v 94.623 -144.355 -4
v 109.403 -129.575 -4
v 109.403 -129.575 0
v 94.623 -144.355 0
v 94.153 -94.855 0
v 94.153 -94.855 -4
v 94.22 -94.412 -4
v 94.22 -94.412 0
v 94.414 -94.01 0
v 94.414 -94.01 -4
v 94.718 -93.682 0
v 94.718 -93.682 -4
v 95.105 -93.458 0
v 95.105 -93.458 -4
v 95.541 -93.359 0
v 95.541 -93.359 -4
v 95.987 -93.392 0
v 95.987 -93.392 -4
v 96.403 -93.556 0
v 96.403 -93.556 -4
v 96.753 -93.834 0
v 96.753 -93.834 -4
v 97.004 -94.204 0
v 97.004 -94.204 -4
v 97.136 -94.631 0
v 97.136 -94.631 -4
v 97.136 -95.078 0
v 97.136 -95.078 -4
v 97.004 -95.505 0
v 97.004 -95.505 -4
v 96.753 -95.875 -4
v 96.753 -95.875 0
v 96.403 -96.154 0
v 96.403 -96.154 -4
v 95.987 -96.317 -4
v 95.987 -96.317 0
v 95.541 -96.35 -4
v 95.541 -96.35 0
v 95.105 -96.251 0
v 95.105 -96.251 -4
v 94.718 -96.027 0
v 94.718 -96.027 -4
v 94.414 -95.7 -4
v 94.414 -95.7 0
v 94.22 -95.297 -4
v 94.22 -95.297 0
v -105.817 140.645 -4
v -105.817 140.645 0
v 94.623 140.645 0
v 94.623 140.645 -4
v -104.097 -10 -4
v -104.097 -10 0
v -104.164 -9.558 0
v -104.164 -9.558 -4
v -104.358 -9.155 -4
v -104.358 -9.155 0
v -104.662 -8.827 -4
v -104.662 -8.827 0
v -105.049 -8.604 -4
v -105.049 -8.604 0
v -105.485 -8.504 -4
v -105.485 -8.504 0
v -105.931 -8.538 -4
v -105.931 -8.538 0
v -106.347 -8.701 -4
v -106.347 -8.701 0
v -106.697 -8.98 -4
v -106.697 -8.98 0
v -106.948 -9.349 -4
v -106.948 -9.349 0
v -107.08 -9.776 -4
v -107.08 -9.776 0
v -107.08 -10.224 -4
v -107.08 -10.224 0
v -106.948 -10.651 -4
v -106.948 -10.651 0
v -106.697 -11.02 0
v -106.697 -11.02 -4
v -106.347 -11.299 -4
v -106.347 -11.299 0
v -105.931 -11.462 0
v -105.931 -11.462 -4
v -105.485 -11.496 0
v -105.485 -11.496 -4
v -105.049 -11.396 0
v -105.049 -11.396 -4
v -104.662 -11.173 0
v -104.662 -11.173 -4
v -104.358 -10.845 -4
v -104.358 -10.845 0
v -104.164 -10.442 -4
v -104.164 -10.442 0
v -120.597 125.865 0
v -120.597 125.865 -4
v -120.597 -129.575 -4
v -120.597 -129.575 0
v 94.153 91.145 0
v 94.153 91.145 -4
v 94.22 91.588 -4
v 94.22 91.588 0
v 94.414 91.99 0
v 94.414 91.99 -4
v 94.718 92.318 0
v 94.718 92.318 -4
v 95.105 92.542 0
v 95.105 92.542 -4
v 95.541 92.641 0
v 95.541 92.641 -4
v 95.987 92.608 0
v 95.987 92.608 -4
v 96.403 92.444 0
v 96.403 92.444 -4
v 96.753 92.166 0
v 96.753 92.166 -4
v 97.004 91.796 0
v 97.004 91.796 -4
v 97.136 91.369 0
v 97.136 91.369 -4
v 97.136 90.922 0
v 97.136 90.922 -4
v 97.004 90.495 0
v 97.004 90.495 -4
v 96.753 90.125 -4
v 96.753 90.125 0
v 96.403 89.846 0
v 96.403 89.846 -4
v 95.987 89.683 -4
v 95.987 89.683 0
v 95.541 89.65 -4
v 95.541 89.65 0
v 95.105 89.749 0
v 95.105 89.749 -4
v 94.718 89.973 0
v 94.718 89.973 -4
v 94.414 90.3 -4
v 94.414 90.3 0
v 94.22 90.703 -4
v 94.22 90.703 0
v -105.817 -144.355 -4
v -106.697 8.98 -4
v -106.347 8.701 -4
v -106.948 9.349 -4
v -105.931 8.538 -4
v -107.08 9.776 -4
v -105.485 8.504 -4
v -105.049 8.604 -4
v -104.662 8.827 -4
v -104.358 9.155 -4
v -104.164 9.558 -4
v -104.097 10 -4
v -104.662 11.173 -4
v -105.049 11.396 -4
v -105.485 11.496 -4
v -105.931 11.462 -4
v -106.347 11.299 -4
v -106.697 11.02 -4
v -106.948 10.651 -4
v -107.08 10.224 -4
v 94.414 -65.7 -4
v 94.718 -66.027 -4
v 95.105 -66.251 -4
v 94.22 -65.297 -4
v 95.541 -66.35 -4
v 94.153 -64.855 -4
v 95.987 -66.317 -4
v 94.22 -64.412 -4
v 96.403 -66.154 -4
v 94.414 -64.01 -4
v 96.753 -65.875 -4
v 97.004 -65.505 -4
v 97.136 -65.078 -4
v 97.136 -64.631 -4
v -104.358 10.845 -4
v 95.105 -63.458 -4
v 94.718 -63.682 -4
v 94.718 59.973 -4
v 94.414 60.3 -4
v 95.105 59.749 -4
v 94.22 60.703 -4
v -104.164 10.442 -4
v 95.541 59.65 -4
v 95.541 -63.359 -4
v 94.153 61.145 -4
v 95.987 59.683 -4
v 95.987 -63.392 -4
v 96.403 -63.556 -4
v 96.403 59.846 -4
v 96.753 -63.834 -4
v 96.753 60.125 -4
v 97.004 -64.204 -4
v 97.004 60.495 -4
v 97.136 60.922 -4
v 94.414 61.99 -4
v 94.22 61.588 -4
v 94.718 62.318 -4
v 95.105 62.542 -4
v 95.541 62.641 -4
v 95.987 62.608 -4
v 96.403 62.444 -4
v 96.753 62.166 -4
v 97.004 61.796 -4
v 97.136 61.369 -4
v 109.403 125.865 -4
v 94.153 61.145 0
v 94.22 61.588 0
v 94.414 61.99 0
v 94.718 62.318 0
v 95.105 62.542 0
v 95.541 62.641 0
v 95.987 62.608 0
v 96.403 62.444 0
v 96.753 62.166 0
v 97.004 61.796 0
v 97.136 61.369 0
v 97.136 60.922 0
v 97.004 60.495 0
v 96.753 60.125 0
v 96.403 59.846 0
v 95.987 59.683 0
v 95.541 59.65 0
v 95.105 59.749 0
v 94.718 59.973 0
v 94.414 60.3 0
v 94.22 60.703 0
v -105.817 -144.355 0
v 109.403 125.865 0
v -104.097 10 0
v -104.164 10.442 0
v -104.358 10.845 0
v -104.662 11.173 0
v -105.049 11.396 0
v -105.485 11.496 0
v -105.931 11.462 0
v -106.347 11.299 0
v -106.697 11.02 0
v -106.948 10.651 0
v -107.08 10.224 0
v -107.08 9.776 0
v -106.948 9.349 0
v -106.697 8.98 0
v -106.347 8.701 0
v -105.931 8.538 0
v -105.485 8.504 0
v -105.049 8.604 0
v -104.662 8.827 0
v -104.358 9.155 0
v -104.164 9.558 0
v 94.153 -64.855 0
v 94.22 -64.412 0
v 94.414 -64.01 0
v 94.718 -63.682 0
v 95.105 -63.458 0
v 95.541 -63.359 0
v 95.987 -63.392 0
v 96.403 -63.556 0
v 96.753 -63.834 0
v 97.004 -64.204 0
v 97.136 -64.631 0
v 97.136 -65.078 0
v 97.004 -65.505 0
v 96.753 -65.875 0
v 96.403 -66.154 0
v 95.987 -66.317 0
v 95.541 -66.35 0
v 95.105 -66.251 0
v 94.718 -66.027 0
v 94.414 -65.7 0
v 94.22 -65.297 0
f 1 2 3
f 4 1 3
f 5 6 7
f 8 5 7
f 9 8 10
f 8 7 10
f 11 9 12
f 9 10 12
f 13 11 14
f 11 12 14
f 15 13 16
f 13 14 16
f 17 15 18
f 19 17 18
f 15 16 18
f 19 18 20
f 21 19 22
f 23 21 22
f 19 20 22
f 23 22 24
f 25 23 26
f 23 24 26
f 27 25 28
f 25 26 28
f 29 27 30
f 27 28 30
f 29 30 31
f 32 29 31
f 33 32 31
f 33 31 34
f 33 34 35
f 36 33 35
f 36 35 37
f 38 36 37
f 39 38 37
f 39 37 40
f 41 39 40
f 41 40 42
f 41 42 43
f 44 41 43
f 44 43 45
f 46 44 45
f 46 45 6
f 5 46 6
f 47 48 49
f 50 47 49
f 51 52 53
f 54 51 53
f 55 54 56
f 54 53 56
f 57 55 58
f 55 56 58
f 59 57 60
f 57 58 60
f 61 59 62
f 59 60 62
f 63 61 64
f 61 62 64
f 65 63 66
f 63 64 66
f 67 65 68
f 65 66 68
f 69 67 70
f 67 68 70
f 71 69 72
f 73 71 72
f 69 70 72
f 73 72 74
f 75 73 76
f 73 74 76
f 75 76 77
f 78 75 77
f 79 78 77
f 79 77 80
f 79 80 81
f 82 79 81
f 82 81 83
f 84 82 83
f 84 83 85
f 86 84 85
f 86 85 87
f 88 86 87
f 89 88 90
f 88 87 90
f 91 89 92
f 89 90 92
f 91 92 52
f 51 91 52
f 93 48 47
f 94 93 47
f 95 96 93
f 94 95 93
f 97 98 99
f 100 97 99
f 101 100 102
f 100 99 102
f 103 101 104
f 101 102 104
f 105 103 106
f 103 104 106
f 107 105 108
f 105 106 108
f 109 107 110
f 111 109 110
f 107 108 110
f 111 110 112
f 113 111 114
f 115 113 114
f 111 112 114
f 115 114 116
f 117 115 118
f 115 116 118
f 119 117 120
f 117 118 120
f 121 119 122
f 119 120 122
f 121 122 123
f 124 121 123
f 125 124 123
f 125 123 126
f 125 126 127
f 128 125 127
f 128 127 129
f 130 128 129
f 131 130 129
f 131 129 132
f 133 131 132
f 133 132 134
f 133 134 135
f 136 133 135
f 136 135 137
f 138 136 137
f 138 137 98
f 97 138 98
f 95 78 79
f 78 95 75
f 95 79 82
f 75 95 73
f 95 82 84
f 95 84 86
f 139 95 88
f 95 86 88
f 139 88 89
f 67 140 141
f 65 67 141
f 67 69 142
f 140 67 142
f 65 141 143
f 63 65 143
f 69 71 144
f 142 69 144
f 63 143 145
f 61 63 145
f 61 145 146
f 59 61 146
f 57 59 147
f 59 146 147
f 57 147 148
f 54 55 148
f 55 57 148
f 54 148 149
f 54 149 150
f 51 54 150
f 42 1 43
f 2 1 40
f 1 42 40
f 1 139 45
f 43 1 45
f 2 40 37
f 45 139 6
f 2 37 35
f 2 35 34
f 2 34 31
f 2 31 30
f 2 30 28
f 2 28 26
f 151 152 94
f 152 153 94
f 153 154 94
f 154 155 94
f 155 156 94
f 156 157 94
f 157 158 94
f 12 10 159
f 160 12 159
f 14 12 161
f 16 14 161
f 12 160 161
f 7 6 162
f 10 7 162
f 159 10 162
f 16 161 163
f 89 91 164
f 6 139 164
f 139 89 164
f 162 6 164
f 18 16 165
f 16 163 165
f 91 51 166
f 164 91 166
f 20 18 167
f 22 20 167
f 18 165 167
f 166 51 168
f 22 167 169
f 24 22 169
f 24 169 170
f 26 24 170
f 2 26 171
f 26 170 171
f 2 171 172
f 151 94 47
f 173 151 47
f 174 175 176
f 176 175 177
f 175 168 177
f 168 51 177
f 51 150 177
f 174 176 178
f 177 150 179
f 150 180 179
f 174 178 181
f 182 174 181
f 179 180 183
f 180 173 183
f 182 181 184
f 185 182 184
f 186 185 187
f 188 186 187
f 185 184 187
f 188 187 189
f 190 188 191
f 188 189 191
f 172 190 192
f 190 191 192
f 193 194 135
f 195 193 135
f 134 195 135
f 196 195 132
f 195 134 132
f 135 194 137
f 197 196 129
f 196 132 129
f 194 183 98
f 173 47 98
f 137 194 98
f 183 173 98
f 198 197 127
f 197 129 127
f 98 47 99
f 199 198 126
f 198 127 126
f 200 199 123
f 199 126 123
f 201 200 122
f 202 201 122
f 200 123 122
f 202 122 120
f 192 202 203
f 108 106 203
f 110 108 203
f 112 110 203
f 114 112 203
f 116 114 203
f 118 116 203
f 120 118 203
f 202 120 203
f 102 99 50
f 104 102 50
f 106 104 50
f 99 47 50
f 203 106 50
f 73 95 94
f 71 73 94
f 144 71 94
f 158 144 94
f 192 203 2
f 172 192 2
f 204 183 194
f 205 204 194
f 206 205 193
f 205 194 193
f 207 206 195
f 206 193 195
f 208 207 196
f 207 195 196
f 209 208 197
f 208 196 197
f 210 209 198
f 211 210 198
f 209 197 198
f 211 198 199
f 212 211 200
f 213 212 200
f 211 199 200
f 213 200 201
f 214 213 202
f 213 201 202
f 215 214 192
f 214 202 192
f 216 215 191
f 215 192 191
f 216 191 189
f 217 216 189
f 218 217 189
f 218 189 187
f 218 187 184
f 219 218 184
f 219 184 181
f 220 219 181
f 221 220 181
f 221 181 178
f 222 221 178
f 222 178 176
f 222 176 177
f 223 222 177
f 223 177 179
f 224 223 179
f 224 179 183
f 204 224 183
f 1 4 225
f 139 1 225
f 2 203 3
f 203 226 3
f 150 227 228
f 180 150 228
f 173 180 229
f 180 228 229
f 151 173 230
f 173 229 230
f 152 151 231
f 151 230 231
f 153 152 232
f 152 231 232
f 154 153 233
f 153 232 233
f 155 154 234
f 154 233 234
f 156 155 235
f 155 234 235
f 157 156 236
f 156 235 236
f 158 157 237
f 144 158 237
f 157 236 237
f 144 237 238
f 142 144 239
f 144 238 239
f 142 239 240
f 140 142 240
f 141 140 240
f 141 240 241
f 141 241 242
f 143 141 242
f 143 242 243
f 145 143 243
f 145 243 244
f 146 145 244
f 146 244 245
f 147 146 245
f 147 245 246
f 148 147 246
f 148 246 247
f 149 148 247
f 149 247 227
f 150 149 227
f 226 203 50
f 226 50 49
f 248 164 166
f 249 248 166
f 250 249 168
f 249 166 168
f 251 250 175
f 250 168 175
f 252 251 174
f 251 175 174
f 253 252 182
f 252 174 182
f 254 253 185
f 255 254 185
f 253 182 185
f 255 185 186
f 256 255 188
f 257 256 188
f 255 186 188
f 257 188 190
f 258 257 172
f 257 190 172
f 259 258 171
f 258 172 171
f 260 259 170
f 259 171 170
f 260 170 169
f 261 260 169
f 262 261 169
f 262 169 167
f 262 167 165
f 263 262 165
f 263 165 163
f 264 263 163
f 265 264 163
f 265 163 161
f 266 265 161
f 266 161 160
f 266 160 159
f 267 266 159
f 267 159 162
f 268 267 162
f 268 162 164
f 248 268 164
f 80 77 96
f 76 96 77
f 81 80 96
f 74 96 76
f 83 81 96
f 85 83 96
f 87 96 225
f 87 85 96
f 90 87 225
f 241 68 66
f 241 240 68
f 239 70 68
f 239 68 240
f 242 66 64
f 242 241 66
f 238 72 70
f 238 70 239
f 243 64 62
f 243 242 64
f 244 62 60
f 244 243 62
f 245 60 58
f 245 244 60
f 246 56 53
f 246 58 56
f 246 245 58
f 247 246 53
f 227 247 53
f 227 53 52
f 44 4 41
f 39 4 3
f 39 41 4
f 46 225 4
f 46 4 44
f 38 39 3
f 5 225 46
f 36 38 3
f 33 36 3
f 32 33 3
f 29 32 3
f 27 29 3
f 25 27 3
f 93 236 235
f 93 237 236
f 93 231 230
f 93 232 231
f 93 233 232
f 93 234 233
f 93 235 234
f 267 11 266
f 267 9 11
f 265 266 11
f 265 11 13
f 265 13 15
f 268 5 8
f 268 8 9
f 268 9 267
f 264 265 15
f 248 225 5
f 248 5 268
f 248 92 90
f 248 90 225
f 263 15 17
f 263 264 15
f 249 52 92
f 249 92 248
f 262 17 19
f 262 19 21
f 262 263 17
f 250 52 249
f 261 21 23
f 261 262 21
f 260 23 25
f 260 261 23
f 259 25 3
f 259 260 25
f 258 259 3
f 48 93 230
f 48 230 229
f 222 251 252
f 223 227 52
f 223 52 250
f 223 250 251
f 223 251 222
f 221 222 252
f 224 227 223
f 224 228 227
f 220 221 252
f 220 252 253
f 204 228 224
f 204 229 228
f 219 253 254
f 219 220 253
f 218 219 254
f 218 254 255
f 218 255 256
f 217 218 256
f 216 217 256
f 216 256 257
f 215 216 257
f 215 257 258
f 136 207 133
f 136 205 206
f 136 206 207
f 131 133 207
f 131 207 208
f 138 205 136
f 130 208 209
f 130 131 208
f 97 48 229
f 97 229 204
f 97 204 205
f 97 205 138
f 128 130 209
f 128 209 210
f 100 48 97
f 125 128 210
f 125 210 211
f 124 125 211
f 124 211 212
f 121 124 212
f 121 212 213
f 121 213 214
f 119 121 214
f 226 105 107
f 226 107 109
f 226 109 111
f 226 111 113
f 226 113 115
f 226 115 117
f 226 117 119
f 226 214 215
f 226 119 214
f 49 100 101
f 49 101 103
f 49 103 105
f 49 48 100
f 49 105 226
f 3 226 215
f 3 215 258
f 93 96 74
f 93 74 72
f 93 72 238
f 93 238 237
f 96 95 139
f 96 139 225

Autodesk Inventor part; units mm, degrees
ref_plane "YZ Plane" through (0, 0, 0) normal (1, 0, 0) x (0, 1, 0)
ref_plane "XZ Plane" through (0, 0, 0) normal (0, 1, 0) x (-1, 0, 0)
ref_plane "XY Plane" through (0, 0, 0) normal (0, 0, 1) x (1, 0, 0)
sketch "Эскиз1" plane through (0, 0, 0) normal (0, 0, 1) x (1, 0, 0)
  line L0 (-168.7947, 191.7053) -> (-168.7947, -196.2947) projected
  line L1 (-168.7947, -196.2947) -> (170.2053, -196.2947) projected
  line L2 (170.2053, -196.2947) -> (170.2053, 191.7053) projected
  line L3 (170.2053, 191.7053) -> (-168.7947, 191.7053) projected
  line L4 (-120.597, 140.6454) -> (109.403, 140.6454)
  line L5 (109.403, 140.6454) -> (109.403, -144.3546)
  line L6 (109.403, -144.3546) -> (-120.597, -144.3546)
  line L7 (-120.597, -144.3546) -> (-120.597, 140.6454)
  line L8 (109.903, 141.1454) -> (109.903, -144.8546) projected
  line L9 (109.903, -144.8546) -> (-121.097, -144.8546) projected
  line L10 (-121.097, -144.8546) -> (-121.097, 141.1454) projected
  line L11 (-121.097, 141.1454) -> (109.903, 141.1454) projected
  line L12 (170.903, -196.8546) -> (170.903, 193.1454) projected
  line L13 (170.903, 193.1454) -> (-173.097, 193.1454) projected
  line L14 (-173.097, 193.1454) -> (-173.097, -196.8546) projected
  line L15 (-173.097, -196.8546) -> (170.903, -196.8546) projected
  point P0 (0, 0)
  dimension "d6" = 0.5
  dimension "d7" = 0.5
  dimension "d8" = 0.5
  dimension "d9" = 0.5
extrude "Выдавливание1" add sketch "Эскиз1" against normal blind 4 contours L4 L5 L6 L7
chamfer "Фаска1" distance 14.78 angle 45 4 edges at (-120.597, -144.3546, -2) (109.403, -144.3546, -2) (109.403, 140.6454, -2) (-120.597, 140.6454, -2)
sketch "Эскиз2" plane through (0, 0, -4) normal (0, 0, -1) x (-1, 0, 0)
  circle A0 centre (-95.653, -94.8546) radius 1.5 projected
  circle A1 centre (-95.653, -64.8546) radius 1.5 projected
  circle A2 centre (-95.653, 61.1454) radius 1.5 projected
  circle A3 centre (-95.653, 91.1454) radius 1.5 projected
  line L0 (-109.403, 125.8654) -> (-109.403, -129.5746) projected
  point P0 (0, 0)
  dimension "d13" = 3
  dimension "d16" = 30
  dimension "d17" = 13.75
extrude "Выдавливание2" cut sketch "Эскиз2" against normal blind 10
sketch "Эскиз3" plane through (0, 0, 0) normal (0, 0, 1) x (1, 0, 0)
  line L0 (0, 0) -> (-163.3062, 0) construction
  circle A0 centre (-105.597, -10) radius 1.5
  circle A1 centre (-105.597, 10) radius 1.5
  line L1 (-120.597, -129.5746) -> (-120.597, 125.8654) projected
  dimension "d18" = 3
  dimension "d19" = 3
  dimension "d20" = 20
  dimension "d21" = 15
extrude "Выдавливание3" cut sketch "Эскиз3" against normal blind 10
properties part number "крышка 2"
